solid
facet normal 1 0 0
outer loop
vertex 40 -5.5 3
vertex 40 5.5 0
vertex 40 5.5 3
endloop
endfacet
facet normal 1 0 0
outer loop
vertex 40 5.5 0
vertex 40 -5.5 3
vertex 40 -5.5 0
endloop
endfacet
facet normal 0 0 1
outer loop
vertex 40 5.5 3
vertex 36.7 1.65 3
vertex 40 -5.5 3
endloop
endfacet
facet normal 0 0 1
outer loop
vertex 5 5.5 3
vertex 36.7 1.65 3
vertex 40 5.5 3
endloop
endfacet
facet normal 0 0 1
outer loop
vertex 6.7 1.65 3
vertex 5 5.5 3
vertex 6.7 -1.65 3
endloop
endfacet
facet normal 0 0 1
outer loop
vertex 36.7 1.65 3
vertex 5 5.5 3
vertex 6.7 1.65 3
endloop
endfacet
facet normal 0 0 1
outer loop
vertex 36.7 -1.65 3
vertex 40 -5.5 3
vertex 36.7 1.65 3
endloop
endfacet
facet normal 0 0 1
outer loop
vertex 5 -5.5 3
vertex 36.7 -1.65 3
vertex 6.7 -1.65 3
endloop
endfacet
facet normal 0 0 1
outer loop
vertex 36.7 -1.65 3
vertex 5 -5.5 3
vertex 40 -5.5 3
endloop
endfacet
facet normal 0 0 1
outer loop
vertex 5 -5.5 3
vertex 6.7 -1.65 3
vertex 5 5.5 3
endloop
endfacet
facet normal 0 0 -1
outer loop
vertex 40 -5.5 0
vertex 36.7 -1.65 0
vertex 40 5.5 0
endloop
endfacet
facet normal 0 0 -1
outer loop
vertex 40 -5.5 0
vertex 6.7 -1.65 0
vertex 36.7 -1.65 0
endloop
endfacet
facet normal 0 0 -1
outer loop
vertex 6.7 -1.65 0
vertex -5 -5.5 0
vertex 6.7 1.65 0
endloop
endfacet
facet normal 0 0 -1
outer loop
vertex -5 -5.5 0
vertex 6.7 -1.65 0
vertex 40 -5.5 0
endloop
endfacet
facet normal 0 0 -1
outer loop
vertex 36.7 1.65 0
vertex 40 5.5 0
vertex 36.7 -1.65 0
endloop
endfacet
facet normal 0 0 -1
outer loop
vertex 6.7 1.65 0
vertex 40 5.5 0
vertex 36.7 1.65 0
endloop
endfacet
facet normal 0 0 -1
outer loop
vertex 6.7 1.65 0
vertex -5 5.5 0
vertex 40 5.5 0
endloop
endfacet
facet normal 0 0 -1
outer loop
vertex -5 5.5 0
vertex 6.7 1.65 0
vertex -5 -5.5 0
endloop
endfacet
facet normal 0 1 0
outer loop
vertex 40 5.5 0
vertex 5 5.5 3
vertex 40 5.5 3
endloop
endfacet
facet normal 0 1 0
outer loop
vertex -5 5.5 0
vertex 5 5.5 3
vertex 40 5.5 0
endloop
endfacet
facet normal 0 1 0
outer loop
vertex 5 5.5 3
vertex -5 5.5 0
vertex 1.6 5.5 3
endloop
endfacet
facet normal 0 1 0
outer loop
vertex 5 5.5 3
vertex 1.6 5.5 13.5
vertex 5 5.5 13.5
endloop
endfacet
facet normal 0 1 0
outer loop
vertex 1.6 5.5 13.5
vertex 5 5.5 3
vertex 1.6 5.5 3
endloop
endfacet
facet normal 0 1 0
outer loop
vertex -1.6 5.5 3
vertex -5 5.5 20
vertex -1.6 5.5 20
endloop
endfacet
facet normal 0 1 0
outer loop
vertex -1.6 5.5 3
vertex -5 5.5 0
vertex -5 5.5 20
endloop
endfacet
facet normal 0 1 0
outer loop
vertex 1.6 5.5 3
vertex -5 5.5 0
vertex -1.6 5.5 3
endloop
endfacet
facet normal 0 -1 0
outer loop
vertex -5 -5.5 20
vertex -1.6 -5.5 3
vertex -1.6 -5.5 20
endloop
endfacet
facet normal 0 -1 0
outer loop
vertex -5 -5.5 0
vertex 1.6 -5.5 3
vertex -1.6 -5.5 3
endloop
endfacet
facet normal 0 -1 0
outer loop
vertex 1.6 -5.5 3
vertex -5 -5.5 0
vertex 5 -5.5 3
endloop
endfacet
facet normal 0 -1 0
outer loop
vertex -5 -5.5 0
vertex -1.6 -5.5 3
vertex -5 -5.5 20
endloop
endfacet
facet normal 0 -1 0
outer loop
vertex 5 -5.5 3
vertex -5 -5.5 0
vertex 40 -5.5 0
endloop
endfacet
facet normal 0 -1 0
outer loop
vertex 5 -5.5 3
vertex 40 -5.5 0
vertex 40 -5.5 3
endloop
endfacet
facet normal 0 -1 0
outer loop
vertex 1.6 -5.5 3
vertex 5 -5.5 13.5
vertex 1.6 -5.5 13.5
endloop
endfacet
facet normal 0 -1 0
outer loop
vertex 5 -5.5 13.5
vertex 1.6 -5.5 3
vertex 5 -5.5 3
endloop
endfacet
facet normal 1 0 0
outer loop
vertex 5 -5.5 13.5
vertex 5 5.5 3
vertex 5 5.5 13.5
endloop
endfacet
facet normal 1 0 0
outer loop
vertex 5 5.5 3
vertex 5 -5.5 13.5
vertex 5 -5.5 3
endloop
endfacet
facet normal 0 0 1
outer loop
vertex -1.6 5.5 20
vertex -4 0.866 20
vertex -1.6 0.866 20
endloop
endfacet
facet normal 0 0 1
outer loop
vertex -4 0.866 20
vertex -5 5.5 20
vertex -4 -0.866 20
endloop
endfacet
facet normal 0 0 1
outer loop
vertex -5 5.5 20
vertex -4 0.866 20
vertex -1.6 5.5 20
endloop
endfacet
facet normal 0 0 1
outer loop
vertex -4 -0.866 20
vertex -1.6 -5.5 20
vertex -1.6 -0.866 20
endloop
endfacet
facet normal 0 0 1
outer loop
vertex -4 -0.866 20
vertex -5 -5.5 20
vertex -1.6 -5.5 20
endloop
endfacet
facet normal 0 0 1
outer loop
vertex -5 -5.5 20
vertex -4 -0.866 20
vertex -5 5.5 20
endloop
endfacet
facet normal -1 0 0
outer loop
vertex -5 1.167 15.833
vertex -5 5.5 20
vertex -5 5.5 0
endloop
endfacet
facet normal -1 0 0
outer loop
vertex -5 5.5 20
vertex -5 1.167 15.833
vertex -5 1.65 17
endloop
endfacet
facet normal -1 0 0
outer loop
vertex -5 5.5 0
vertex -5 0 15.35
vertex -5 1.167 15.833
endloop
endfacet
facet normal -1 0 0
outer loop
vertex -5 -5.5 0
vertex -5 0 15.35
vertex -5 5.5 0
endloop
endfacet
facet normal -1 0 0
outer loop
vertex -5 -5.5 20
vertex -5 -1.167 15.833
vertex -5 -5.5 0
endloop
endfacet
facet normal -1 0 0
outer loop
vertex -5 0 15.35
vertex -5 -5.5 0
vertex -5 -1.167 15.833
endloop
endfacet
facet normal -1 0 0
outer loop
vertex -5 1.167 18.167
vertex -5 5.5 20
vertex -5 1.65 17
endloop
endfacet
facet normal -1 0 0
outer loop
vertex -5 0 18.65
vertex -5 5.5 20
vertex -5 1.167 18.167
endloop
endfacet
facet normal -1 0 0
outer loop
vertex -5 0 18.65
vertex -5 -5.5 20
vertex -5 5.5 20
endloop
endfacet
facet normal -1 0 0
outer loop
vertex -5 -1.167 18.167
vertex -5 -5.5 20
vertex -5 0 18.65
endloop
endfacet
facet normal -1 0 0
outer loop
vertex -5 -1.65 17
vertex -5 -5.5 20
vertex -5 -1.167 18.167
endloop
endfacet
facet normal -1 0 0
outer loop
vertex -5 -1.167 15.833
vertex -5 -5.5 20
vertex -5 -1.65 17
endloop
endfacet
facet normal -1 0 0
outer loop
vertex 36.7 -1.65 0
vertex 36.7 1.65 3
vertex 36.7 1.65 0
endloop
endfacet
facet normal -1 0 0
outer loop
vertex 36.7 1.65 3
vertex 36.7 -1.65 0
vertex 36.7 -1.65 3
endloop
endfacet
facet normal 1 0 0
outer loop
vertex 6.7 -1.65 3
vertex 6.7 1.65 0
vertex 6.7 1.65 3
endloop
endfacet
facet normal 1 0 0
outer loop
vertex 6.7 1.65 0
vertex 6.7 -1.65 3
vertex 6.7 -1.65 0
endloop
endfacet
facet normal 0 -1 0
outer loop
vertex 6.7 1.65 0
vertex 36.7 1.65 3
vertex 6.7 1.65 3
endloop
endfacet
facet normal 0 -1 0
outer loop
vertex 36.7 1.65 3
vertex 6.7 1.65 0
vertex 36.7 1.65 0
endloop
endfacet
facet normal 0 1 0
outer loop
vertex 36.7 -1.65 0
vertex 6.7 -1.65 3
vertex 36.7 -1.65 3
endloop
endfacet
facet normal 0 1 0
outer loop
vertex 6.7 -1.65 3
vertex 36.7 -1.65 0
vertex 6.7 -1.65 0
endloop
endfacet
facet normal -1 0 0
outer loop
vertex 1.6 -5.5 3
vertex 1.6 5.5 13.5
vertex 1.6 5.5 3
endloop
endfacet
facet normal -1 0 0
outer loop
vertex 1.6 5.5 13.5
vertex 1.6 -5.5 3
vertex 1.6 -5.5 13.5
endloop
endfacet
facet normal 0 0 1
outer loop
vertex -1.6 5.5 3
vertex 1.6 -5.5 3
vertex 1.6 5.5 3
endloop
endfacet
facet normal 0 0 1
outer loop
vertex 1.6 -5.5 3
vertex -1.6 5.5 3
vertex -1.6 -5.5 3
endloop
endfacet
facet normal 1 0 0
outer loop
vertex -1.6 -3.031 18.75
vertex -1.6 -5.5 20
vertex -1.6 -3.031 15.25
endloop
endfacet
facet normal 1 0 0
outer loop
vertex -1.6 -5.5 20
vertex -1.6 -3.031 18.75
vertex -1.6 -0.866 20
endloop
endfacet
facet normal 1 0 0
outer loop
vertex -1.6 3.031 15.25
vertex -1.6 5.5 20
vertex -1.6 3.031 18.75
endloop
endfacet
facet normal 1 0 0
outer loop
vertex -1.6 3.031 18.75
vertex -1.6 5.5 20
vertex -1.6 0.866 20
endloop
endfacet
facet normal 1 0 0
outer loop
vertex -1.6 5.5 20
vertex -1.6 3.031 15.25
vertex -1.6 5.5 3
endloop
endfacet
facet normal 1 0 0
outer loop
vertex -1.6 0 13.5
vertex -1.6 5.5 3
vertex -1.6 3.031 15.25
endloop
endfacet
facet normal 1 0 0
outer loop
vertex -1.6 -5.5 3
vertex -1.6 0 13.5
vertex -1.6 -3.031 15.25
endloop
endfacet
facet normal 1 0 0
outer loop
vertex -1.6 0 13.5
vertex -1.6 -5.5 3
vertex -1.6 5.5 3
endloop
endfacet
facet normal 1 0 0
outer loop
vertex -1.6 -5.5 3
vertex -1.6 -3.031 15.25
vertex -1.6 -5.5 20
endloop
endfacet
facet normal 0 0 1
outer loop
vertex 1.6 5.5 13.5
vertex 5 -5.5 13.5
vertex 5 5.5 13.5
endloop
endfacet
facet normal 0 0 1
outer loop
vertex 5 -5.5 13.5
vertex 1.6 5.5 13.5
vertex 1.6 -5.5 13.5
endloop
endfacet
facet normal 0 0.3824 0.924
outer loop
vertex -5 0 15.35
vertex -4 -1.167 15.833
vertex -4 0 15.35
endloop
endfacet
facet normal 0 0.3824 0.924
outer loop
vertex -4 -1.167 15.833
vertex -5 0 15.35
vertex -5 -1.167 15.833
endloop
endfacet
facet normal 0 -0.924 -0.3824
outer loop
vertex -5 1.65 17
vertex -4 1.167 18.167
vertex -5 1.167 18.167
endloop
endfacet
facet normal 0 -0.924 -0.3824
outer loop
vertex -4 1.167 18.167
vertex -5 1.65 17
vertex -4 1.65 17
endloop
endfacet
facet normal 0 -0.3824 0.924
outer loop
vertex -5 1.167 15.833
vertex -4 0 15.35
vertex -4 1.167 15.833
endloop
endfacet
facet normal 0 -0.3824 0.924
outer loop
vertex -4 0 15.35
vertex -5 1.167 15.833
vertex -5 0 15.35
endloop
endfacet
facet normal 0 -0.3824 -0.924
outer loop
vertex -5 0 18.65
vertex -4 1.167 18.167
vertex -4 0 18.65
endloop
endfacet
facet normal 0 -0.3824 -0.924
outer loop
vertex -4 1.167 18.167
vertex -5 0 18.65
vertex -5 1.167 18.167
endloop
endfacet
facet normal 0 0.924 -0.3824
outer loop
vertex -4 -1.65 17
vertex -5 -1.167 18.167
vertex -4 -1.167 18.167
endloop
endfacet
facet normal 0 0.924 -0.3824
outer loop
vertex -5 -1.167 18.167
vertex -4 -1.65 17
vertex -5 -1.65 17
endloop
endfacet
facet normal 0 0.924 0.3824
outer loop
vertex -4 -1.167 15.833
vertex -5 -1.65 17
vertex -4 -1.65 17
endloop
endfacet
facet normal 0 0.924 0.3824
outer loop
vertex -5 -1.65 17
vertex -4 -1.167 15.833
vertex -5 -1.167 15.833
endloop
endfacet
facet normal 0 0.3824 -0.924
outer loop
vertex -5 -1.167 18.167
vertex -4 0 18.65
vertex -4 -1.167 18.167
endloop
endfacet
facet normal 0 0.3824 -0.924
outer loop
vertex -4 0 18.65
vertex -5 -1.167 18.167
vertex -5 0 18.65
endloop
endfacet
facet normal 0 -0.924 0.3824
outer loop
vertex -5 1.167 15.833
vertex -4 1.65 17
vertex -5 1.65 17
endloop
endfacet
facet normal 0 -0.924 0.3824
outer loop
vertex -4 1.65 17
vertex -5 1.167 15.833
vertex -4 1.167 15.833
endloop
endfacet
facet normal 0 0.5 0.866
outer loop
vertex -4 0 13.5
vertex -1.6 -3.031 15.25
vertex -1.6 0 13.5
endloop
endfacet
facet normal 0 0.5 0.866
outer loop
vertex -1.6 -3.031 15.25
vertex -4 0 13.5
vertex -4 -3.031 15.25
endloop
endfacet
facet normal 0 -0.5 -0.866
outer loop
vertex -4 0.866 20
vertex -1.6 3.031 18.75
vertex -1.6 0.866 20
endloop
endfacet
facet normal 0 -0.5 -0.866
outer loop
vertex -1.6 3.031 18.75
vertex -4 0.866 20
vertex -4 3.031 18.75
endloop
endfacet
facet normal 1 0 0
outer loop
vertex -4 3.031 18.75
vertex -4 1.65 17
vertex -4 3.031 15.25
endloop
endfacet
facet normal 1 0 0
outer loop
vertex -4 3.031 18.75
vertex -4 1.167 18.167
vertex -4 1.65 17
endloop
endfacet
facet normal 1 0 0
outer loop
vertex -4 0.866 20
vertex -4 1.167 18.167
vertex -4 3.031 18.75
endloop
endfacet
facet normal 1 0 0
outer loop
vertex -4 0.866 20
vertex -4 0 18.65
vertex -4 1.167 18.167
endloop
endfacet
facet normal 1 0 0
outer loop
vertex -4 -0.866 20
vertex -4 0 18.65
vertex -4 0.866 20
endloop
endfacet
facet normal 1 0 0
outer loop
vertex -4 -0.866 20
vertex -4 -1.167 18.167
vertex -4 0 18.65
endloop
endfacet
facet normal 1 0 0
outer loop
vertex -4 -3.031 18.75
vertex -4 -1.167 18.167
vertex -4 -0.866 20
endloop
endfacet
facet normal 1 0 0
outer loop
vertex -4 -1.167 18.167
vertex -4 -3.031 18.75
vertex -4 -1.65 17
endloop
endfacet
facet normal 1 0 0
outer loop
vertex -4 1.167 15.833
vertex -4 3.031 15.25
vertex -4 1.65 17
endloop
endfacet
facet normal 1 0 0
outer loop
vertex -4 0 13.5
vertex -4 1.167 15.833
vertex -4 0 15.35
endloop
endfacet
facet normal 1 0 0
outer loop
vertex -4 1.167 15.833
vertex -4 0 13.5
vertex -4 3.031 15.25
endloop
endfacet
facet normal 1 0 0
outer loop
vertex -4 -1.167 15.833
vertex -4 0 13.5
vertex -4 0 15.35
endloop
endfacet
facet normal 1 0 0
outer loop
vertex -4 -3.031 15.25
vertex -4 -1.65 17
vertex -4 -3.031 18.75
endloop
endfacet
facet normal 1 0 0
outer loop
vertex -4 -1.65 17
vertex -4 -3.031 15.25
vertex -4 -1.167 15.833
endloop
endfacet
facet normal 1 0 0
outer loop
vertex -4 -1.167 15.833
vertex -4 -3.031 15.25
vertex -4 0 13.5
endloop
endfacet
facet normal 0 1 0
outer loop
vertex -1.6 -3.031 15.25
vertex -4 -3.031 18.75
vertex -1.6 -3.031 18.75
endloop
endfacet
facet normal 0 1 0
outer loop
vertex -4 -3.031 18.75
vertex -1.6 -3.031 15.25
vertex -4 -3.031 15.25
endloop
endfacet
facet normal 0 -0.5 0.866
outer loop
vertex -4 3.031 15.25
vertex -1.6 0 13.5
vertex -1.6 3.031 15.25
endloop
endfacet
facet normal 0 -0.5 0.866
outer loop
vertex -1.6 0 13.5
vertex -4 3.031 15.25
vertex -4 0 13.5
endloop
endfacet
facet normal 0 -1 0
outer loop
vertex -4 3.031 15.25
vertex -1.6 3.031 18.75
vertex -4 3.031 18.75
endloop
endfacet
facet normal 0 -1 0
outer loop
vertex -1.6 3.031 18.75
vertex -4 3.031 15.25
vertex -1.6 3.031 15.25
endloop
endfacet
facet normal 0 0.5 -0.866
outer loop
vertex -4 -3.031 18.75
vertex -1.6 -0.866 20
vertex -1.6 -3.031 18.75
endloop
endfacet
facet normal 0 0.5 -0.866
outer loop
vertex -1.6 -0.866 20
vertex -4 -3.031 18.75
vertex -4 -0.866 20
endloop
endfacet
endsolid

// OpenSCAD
// Robot DC-motor: sensor keyesIR - holder

// Vertical part.
h_vert = 40;
w_vert = 11;
d_vert =  3;

// Internal diameter of nut.
id_nut = 3.3;

// Out diameter of nut.
od_nut = 7;

// Height of nut.
h_nut = 4;

// Length and diameter of screws.
len_screw = 20;
dia_screw = 3.3;

// Horizontal part.
h_horiz = 10;
w_horiz = 11;
d_horiz =  20;

// Width of chassis.
w_chassis = 3.2;

// Vertical hole.
h_vhole = h_vert - 2*id_nut - (h_horiz - w_chassis)/2;
w_vhole = id_nut;
d_vhole =  10;

// Width of chassis.
w_chassis = 3.2;

// Horizontal hole.
h_hhole = w_chassis;
w_hhole = w_horiz+1;
d_hhole = d_horiz;

// Block of nut.
h_nut_hole = (h_horiz - w_chassis)/2 + 1;
w_nut_hole = w_horiz+1;
d_nut_hole = od_nut;


module solid_part() {
  union() {
// Vertical part.
    translate([h_vert/2, 0, d_vert/2])
      cube([h_vert, w_vert, d_vert], center = true);
    
// Horizontal part.
    translate([0, 0, d_horiz/2])
      cube([h_horiz, w_horiz, d_horiz], center = true);
  }    
}    

module  holes() {
    
  union() {    
// Vertical hole.
    translate([h_vhole/2 + id_nut + (h_horiz - w_chassis)/2, 0, d_vhole/2 - 0.5])  
      #cube([h_vhole, w_vhole, d_vhole], center = true);
    
// Horizontal hole.
    translate([0, 0, d_horiz/2 + d_vert])
      cube([h_hhole, w_hhole, d_hhole], center = true);  

// Block of nut.
    translate([(h_horiz - w_chassis)/2, 0, d_horiz/2 + d_nut_hole])
      #cube([h_nut_hole, w_nut_hole, d_nut_hole], center = true);  

// Screw hole.
    translate([0, 0, d_horiz/2 + d_nut_hole])
      rotate(a=[0,90,0])      
        cylinder(h = len_screw, r1 = dia_screw/2, r2 = dia_screw/2, $fn = 8, center = true);      
        

// Nut hole.
    translate([-h_nut/2, 0, d_horiz/2 + d_nut_hole])
      rotate(a=[ 0, 90, 0])      
        #cylinder(h = h_nut, r1 = od_nut/2, r2 = od_nut/2, $fn = 6, center = true);      
  }      

}

difference() {
  solid_part();
  holes();  
}  
